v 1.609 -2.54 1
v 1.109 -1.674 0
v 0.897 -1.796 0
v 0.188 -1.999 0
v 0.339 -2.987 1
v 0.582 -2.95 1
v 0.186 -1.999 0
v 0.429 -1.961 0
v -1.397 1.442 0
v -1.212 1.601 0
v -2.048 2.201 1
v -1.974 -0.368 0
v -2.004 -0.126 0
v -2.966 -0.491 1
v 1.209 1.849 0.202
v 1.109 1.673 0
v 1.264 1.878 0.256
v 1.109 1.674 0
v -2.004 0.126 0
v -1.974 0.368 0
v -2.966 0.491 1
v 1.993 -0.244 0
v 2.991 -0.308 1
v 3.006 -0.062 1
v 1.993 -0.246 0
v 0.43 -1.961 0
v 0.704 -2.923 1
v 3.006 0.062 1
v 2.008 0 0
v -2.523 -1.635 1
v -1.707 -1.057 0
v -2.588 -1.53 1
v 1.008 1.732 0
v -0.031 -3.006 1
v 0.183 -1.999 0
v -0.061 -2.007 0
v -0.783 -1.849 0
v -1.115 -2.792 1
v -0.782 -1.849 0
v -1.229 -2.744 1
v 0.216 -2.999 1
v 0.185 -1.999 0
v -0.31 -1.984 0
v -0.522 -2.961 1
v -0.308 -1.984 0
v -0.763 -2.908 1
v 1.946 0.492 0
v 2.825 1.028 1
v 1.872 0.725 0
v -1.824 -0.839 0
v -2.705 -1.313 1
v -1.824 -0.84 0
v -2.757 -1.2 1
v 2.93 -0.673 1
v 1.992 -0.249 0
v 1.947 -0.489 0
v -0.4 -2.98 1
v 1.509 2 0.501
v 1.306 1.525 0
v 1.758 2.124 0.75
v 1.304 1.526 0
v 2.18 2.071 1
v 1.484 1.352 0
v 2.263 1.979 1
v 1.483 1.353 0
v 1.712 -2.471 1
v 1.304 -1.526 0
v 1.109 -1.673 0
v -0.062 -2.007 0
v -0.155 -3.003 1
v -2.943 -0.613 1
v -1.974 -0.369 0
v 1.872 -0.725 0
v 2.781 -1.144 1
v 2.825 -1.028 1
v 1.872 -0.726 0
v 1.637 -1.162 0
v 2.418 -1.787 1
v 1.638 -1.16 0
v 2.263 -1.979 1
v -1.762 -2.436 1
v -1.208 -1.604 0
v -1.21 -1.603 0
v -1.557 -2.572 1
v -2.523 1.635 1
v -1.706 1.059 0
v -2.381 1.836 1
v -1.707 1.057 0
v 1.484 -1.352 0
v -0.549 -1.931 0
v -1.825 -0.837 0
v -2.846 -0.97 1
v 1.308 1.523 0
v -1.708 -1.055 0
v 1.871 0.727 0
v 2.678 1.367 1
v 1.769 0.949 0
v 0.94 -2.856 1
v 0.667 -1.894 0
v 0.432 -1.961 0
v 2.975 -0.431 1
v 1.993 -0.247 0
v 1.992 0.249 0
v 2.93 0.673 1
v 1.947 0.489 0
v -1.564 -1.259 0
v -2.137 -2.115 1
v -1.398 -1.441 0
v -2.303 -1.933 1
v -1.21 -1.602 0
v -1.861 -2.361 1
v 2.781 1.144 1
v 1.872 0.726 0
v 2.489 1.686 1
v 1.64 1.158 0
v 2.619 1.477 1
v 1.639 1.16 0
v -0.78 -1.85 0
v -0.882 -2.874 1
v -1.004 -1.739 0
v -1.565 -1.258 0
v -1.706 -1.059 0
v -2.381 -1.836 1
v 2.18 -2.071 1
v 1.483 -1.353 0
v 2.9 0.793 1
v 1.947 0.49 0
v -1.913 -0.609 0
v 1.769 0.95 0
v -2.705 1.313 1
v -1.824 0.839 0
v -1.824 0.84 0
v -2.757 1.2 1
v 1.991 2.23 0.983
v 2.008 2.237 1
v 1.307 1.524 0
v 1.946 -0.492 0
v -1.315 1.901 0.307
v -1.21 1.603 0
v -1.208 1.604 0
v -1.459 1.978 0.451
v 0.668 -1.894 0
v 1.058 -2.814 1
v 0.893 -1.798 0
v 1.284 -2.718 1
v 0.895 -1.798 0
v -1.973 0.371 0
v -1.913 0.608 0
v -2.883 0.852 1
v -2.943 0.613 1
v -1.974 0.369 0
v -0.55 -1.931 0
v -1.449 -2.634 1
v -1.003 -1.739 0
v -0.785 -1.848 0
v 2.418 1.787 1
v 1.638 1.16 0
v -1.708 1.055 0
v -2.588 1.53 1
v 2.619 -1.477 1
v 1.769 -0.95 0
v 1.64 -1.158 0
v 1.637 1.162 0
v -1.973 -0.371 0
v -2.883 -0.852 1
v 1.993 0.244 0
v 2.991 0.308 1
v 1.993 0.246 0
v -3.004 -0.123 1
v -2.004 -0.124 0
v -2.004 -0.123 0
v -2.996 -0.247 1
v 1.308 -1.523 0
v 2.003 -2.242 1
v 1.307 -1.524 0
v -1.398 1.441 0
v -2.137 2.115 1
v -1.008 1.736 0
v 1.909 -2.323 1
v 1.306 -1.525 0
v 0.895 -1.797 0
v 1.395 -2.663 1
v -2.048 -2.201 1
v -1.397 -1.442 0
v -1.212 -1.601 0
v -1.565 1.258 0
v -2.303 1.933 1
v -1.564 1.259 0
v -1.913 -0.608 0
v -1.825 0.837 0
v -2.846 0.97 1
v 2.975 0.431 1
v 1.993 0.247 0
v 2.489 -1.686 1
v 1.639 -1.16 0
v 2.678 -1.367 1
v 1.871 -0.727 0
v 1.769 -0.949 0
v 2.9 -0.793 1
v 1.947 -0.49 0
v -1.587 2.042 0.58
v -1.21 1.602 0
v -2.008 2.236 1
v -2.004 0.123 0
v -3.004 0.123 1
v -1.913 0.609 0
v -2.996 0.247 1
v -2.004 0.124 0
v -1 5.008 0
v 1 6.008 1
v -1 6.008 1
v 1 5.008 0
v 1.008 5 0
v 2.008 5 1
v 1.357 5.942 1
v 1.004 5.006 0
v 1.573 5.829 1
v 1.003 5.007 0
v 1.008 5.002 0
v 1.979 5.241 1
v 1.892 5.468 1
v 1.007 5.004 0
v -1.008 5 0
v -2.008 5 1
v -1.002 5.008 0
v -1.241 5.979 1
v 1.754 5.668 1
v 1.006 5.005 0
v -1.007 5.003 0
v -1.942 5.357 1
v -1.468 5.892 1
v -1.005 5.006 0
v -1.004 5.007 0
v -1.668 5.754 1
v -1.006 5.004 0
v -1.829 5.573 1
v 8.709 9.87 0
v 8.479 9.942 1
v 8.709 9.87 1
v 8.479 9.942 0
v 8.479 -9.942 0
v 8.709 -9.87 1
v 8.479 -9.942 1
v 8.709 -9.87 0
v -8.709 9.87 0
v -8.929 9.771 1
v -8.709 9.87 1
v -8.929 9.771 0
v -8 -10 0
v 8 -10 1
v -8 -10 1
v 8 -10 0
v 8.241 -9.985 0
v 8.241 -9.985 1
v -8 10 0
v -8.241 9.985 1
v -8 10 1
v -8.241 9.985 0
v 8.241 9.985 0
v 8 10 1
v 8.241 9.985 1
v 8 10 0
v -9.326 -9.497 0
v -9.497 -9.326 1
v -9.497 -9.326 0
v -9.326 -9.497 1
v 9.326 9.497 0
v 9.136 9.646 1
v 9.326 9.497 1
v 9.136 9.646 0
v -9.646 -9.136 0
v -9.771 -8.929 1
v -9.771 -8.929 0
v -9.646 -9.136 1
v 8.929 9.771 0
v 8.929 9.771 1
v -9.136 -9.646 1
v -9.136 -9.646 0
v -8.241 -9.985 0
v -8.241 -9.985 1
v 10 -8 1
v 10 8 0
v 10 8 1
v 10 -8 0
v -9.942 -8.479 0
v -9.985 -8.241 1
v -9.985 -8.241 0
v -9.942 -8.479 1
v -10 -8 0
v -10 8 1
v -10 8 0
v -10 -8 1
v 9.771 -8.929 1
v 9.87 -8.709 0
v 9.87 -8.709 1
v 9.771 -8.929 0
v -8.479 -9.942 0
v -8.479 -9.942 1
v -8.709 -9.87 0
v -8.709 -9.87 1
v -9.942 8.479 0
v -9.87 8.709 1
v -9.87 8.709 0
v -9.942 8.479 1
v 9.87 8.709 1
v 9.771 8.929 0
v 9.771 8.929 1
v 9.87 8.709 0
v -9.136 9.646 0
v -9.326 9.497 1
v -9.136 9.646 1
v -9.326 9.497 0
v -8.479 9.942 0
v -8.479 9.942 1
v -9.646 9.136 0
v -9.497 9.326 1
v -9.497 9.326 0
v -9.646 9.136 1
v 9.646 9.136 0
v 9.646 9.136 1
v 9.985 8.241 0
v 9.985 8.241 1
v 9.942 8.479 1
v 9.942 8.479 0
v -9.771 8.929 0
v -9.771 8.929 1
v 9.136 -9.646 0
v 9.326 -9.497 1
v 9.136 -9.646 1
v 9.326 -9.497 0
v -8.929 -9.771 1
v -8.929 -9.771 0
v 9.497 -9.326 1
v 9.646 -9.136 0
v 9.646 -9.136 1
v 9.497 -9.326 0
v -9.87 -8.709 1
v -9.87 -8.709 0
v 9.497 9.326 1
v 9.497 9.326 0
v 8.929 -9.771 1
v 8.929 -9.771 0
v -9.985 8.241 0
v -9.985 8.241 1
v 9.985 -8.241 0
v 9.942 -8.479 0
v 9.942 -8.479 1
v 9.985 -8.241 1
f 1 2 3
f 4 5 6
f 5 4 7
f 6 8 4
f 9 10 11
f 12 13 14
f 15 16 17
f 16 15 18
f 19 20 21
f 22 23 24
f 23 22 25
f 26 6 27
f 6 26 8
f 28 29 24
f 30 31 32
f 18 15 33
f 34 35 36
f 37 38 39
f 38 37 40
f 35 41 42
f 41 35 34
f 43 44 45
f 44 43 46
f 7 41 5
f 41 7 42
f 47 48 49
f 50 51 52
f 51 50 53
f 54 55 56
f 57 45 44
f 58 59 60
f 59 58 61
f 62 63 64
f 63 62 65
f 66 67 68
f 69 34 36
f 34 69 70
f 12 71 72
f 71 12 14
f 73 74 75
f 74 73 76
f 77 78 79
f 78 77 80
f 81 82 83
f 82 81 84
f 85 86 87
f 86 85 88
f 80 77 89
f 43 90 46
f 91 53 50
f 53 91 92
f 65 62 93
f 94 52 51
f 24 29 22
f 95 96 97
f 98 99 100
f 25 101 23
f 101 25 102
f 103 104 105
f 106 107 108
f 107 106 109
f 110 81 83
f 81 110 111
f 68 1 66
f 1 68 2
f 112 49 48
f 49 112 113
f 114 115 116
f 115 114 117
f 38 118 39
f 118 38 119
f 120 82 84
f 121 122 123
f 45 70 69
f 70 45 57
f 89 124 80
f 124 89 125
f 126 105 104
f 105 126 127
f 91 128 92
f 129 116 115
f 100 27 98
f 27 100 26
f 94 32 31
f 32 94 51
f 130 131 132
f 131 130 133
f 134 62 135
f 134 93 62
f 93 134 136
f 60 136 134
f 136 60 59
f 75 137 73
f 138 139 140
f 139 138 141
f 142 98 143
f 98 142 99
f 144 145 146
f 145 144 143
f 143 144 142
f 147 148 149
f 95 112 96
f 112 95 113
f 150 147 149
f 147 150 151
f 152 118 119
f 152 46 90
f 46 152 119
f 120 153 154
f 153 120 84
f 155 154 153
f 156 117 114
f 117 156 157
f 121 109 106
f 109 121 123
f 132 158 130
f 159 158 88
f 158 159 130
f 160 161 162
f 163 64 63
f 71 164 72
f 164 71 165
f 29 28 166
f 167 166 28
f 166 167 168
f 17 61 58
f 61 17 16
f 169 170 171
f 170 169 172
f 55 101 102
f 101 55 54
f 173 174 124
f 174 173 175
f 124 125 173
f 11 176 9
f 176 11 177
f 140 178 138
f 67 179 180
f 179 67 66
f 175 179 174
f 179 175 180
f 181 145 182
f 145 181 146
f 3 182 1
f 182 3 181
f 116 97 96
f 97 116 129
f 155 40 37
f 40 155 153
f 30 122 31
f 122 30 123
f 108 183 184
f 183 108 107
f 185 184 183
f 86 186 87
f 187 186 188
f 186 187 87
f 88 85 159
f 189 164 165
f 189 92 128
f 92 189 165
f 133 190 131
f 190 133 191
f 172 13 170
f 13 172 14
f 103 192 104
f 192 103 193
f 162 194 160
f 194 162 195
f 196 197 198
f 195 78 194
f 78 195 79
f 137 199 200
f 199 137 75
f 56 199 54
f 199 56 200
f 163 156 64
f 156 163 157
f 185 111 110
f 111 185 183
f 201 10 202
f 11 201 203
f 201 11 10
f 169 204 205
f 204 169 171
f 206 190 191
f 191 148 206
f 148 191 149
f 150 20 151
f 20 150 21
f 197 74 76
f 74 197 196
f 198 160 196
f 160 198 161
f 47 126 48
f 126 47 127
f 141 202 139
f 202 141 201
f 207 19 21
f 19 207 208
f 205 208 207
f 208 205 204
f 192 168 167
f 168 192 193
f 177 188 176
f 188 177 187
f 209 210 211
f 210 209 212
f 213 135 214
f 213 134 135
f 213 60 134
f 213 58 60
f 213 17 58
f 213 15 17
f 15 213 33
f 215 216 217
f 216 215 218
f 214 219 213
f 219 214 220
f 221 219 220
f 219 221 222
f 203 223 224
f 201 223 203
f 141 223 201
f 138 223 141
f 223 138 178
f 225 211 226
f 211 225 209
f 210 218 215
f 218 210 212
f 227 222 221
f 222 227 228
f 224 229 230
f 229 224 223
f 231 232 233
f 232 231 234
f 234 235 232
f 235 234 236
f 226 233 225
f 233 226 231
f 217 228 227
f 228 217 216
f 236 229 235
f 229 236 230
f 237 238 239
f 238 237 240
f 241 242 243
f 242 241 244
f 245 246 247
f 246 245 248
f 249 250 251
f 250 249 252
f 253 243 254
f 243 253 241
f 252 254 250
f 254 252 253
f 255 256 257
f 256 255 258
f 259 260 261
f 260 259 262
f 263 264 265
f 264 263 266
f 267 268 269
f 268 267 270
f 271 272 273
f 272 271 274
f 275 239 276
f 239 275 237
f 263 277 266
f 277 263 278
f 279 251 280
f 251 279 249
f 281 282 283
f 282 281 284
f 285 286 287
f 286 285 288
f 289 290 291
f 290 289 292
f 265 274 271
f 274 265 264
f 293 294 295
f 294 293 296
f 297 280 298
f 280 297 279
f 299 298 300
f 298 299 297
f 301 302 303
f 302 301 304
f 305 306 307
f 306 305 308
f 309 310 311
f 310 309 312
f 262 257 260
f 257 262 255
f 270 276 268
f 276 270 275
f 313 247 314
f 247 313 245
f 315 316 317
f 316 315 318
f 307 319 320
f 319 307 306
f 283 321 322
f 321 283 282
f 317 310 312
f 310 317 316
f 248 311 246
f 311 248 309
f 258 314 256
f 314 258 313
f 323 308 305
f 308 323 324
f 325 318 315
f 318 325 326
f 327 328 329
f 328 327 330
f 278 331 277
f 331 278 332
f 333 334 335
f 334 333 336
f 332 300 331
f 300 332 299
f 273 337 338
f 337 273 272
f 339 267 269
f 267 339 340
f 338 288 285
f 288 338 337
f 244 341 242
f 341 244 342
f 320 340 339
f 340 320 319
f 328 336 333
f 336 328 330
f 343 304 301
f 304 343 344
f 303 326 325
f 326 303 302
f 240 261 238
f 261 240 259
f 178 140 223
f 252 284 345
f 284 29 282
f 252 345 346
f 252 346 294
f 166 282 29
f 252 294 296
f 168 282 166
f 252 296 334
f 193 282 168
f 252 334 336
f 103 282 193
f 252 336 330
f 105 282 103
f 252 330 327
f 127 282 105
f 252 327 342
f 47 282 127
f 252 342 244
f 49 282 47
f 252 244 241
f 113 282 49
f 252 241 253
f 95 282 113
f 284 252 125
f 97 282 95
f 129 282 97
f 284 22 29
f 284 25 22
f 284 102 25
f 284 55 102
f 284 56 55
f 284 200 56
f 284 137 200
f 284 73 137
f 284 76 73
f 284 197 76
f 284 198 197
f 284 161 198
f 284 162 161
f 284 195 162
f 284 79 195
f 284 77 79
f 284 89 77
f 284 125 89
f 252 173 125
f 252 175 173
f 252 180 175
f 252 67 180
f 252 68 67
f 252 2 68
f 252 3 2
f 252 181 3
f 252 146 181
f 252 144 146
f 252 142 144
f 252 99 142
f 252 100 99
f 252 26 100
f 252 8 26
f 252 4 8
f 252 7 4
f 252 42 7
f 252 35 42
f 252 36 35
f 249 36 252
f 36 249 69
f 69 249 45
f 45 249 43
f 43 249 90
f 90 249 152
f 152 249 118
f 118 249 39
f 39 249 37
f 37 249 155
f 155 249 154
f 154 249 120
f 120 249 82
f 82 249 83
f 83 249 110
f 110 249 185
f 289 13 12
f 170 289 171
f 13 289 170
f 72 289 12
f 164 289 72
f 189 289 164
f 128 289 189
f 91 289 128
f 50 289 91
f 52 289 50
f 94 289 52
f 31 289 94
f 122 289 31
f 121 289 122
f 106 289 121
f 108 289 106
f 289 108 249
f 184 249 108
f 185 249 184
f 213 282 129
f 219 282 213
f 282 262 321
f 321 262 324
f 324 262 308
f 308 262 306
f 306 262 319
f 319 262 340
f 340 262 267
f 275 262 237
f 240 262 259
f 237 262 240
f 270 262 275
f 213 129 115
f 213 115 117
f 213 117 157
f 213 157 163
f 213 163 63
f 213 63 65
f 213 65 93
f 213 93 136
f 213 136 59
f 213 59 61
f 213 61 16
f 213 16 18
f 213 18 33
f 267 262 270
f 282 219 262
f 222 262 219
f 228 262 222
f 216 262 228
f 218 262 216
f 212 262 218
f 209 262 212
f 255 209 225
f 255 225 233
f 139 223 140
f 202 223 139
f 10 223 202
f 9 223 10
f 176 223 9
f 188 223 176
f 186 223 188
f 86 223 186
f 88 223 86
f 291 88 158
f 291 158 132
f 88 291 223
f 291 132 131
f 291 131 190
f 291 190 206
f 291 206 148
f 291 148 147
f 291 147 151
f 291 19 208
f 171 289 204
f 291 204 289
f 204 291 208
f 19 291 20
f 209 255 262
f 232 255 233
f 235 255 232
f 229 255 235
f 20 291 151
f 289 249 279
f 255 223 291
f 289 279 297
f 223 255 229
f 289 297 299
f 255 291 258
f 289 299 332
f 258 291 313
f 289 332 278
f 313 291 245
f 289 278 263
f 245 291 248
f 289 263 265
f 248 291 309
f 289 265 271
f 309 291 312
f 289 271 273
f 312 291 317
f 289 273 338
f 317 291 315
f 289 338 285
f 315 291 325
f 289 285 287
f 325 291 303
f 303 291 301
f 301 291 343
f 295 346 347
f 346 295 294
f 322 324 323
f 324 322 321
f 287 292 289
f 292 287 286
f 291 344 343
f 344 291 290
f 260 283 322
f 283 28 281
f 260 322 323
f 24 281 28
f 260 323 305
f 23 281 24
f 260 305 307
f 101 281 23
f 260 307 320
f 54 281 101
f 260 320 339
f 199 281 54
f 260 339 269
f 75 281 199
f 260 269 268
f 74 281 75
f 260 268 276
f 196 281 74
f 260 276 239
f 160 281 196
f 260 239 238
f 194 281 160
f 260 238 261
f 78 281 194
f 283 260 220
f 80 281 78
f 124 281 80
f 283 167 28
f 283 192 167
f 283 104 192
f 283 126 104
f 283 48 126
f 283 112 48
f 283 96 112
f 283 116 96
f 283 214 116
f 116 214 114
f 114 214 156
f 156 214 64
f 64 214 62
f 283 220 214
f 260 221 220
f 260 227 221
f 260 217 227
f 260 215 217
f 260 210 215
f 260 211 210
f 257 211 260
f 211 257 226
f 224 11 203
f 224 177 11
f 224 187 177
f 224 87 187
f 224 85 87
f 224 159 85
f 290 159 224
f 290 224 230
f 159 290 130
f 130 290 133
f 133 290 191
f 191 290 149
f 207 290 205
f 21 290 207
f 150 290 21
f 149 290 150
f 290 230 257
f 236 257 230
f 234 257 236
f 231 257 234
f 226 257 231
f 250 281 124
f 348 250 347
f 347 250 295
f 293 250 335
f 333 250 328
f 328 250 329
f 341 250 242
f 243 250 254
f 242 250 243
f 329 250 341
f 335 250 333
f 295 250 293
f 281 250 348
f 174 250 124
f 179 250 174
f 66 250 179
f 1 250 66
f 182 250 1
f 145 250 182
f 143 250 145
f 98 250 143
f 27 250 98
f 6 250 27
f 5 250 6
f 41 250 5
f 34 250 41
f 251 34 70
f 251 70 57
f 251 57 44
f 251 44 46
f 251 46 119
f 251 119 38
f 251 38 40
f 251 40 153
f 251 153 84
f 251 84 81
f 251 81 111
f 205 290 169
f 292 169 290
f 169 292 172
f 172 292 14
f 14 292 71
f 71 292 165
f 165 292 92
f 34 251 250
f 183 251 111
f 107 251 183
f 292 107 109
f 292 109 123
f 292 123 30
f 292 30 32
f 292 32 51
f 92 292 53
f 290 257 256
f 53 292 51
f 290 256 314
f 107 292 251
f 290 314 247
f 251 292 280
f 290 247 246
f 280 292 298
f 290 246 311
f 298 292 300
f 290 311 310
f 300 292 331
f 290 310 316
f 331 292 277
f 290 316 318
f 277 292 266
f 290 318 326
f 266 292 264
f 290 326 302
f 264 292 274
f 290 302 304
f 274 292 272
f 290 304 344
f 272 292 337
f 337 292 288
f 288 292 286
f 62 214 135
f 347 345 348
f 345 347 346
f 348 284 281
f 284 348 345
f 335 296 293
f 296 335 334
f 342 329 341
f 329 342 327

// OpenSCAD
// file: ../utils/core/clip.scad
//
// NopSCADlib Copyright Chris Palmer 2018
// nop.head@gmail.com
// hydraraptor.blogspot.com
//
// This file is part of NopSCADlib.
//
// NopSCADlib is free software: you can redistribute it and/or modify it under the terms of the
// GNU General Public License as published by the Free Software Foundation, either version 3 of
// the License, or (at your option) any later version.
//
// NopSCADlib is distributed in the hope that it will be useful, but WITHOUT ANY WARRANTY;
// without even the implied warranty of MERCHANTABILITY or FITNESS FOR A PARTICULAR PURPOSE.
// See the GNU General Public License for more details.
//
// You should have received a copy of the GNU General Public License along with NopSCADlib.
// If not, see <https://www.gnu.org/licenses/>.
//

//
//! Construct arbitrarily large box to partition 3D space and clip objects, useful for creating cross sections to see the inside when debugging.
//!
//! Original version by Doug Moen on the OpenSCAD forum
//
//
module box(xmin, ymin, zmin, xmax, ymax, zmax) //! Construct a box given its bounds
    polyhedron(
        [[xmin, ymin, zmin],  // 0
         [xmin, ymin, zmax],  // 1
         [xmin, ymax, zmin],  // 2
         [xmin, ymax, zmax],  // 3
         [xmax, ymin, zmin],  // 4
         [xmax, ymin, zmax],  // 5
         [xmax, ymax, zmin],  // 6
         [xmax, ymax, zmax]], // 7
        [[7,5,1,3],  // top
         [2,0,4,6],  // bottom
         [5,4,0,1],  // front
         [3,2,6,7],  // back
         [5,7,6,4],  // right
         [0,2,3,1]]  // left
    );

module clip(xmin = -big, ymin = -big, zmin = -big, xmax = big, ymax = big, zmax = big, convexity = 1) //! Clip child to specified boundaries
    render(convexity = convexity) intersection() {
        children();

        box(xmin, ymin, zmin, xmax, ymax, zmax);
    }
// file: ../utils/core/rounded_rectangle.scad
//
// NopSCADlib Copyright Chris Palmer 2018
// nop.head@gmail.com
// hydraraptor.blogspot.com
//
// This file is part of NopSCADlib.
//
// NopSCADlib is free software: you can redistribute it and/or modify it under the terms of the
// GNU General Public License as published by the Free Software Foundation, either version 3 of
// the License, or (at your option) any later version.
//
// NopSCADlib is distributed in the hope that it will be useful, but WITHOUT ANY WARRANTY;
// without even the implied warranty of MERCHANTABILITY or FITNESS FOR A PARTICULAR PURPOSE.
// See the GNU General Public License for more details.
//
// You should have received a copy of the GNU General Public License along with NopSCADlib.
// If not, see <https://www.gnu.org/licenses/>.
//

//
//! Rectangle with rounded corners.
//
module rounded_square(size, r, center = true) //! Like `square()` but with with rounded corners
{
    assert(r < min(size.x, size.y) / 2);
    $fn = r2sides4n(r);
    offset(r) offset(-r) square(size, center = center);
}

module rounded_rectangle(size, r, center = false, xy_center = true) //! Like `cube()` but corners rounded in XY plane and separate centre options for xy and z.
{
    extrude_if(size.z, center = center)
        rounded_square([size.x, size.y], r, xy_center);
}

module rounded_cube_xy(size, r = 0, xy_center = false, z_center = false) //! Like `cube()` but corners rounded in XY plane and separate centre options for xy and z.
{
    extrude_if(size.z, center = z_center)
        rounded_square([size.x, size.y], r, xy_center);
}

module rounded_cube_xz(size, r = 0, xy_center = false, z_center = false) //! Like `cube()` but corners rounded in XZ plane and separate centre options for xy and z.
{
    translate([xy_center ? 0 : size.x / 2, xy_center ? 0 : size.y / 2, z_center ? 0 : size.z / 2])
        rotate([90, 0, 0])
            rounded_cube_xy([size.x, size.z, size.y], r, xy_center = true, z_center = true);
}

module rounded_cube_yz(size, r = 0, xy_center = false, z_center = false) //! Like `cube()` but corners rounded in YX plane and separate centre options for xy and z.
{
    translate([xy_center ? 0 : size.x / 2, xy_center ? 0 : size.y / 2, z_center ? 0 : size.z / 2])
        rotate([90, 0, 90])
            rounded_cube_xy([size.y, size.z, size.x], r, xy_center = true, z_center = true);
}
// file: ../utils/core/teardrops.scad
//
// NopSCADlib Copyright Chris Palmer 2018
// nop.head@gmail.com
// hydraraptor.blogspot.com
//
// This file is part of NopSCADlib.
//
// NopSCADlib is free software: you can redistribute it and/or modify it under the terms of the
// GNU General Public License as published by the Free Software Foundation, either version 3 of
// the License, or (at your option) any later version.
//
// NopSCADlib is distributed in the hope that it will be useful, but WITHOUT ANY WARRANTY;
// without even the implied warranty of MERCHANTABILITY or FITNESS FOR A PARTICULAR PURPOSE.
// See the GNU General Public License for more details.
//
// You should have received a copy of the GNU General Public License along with NopSCADlib.
// If not, see <https://www.gnu.org/licenses/>.
//

//
//! For making horizontal holes that don't need support material.
//! Small holes can get away without it, but they print better with truncated teardrops.
//!
//! Using teardrop_plus() or setting the plus option on other modules will elongate the teardrop vertically by the layer height, so when sliced the staircase tips
//! do not intrude into the circle. See <https://hydraraptor.blogspot.com/2020/07/horiholes-2.html>
//
module teardrop(h, r, center = true, truncate = true, chamfer = 0, chamfer_both_ends = true, plus = false) { //! For making horizontal holes that don't need support material, set `truncate = false` to make traditional RepRap teardrops that don't even need bridging
    module teardrop_2d(r, truncate) {
        er = layer_height / 2 - eps;    // Extrusion edge radius
        R = plus ? r + er : r;          // Corrected radius
        offset = plus ? -er : 0;        // Offset inwards
        hull()
            for(side = [0 : 1])
                mirror([side, 0, 0])
                    intersection() {
                        hull()
                            translate([offset, 0]) {
                                circle4n(R);

                                if (teardrop_angle > 0) {
                                    x = R * tan(teardrop_angle / 2);
                                    if(truncate)
                                        translate([0, R / 2])
                                            square([2 * x, R], center = true);
                                    else
                                        polygon([[0, 0], [eps, 0], [0, R + x * tan(min(teardrop_angle, 90 - eps))]]);
                                }
                            }
                        translate([0, -2 * R])
                            square([R, 4 * R]);
                    }
    }

    render(convexity = 5)
        extrude_if(h, center)
            teardrop_2d(r, truncate);

    teardrop_chamfer(h, center, chamfer, chamfer_both_ends) {
        linear_extrude(eps, center = true)
            teardrop_2d(r + chamfer / 2, truncate);

        translate_z(-chamfer / 2)
            linear_extrude(eps, center = true)
                teardrop_2d(r, truncate);
    }
}

module semi_teardrop(h, r, d = undef, center = true, chamfer = 0, chamfer_both_ends = true, plus = false) { //! A semi teardrop in the positive Y domain
    module semi_teardrop_2d(r, d)
        intersection() {
            R = is_undef(d) ? r : d / 2;
            teardrop(r = R, h = 0, plus = plus);

            sq = R + 1;
            translate([-sq, 0])
                square([2 * sq, sq]);
        }

    render(convexity = 5)
        extrude_if(h, center)
            semi_teardrop_2d(r, d);

    teardrop_chamfer(h, center, chamfer, chamfer_both_ends) {
        linear_extrude(eps, center = true)
            semi_teardrop_2d(r + chamfer / 2, d);

        translate_z(-chamfer / 2)
            linear_extrude(eps, center = true)
                semi_teardrop_2d(r, d);
    }
}

module teardrop_plus(h, r, center = true, truncate = true, chamfer = 0, chamfer_both_ends = true) //! Slightly elongated teardrop to allow for the 3D printing staircase effect
    teardrop(h, r, center, truncate, chamfer, chamfer_both_ends, plus = true);

module tearslot(h, r, w, center = true, chamfer = 0, chamfer_both_ends = true, plus = false) { //! A horizontal slot that doesn't need support material
    module tearslot_2d(r, w)
        hull()
            for(x = [-1, 1])
                translate([x * w / 2, 0]) teardrop(r = r, h = 0, plus = plus);

    extrude_if(h, center)
        tearslot_2d(r, w);

    teardrop_chamfer(h, center, chamfer, chamfer_both_ends) {
        linear_extrude(eps, center = true)
            tearslot_2d(r + chamfer / 2, w);

        translate_z(-chamfer / 2)
            linear_extrude(eps, center = true)
                tearslot_2d(r, w);
    }
}

module vertical_tearslot(h, r, l, center = true, chamfer = 0, chamfer_both_ends = true, plus = false) { //! A vertical slot that doesn't need support material
    module vertical_tearslot_2d(r, l)
        hull()
            for(y = [-1, 1])
                translate([0,  y * l / 2])
                    teardrop(0, r, true, plus = plus);

    extrude_if(h, center)
        vertical_tearslot_2d(r, l);

    teardrop_chamfer(h, center, chamfer, chamfer_both_ends) {
        linear_extrude(eps, center = true)
            vertical_tearslot_2d(r + chamfer / 2, l);

        translate_z(-chamfer / 2)
            linear_extrude(eps, center = true)
                vertical_tearslot_2d(r, l);
    }
}

module teardrop_chamfer(h, center, chamfer, chamfer_both_ends) { //! Helper module for adding chamfer to a teardrop
    if(h && chamfer)
        translate_z(center ? 0 : h / 2)
            for(m = chamfer_both_ends ? [0, 1] : [1])
                mirror([0, 0, m])
                    translate_z((h - eps ) / 2)
                        hull()
                            children();
}
// file: ../utils/core/polyholes.scad
//
// NopSCADlib Copyright Chris Palmer 2018
// nop.head@gmail.com
// hydraraptor.blogspot.com
//
// This file is part of NopSCADlib.
//
// NopSCADlib is free software: you can redistribute it and/or modify it under the terms of the
// GNU General Public License as published by the Free Software Foundation, either version 3 of
// the License, or (at your option) any later version.
//
// NopSCADlib is distributed in the hope that it will be useful, but WITHOUT ANY WARRANTY;
// without even the implied warranty of MERCHANTABILITY or FITNESS FOR A PARTICULAR PURPOSE.
// See the GNU General Public License for more details.
//
// You should have received a copy of the GNU General Public License along with NopSCADlib.
// If not, see <https://www.gnu.org/licenses/>.
//

//
//! A method of making 3D printed holes come out the right size regardless of the printer, providing
//! it gets the linear dimensions right. See <https://hydraraptor.blogspot.com/2011/02/polyholes.html>
//!
//! The module provides `poly_circle()`, `poly_cylinder()` and `poly_ring()` that is useful for making printed washers and pillars.
//!
//! `poly_cylinder()` has a `twist` parameter which can be set to make the polygon rotate each layer.
//! This can be used to mitigate the number of sides being small and make small holes stronger and more round, but is quite slow due to the
//! large increase in the number of facets.
//! When set to 1 the polygons alternate each layer, when set higher the rotation takes `twist + 1` layers to repeat.
//! A small additional rotation is added to make the polygon rotate one more side over the length of the hole to make it appear round when
//! viewed end on.
//!
//! When `twist` is set the resulting cylinder is extended by `eps` at each end so that the exact length of the hole can be used without
//! leaving a scar on either surface.
//
function sides(r, n = undef) = is_undef(n) ? max(round(4 * r), 3) : n ? max(n, 3) : r2sides(r); //! Optimum number of sides for specified radius
function corrected_radius(r, n = undef)   = r / cos(180 / sides(r, n));                         //! Adjusted radius to make flats lie on the circle
function corrected_diameter(d, n = undef) = 2 * corrected_radius(d / 2 , n);                    //! Adjusted diameter to make flats lie on the circle

module poly_circle(r, sides = undef) { //! Make a circle adjusted to print the correct size
    n = sides(r, sides);
    circle(r = corrected_radius(r, n), $fn = n);
}

module poly_cylinder(r, h, center = false, sides = undef, chamfer = false, twist = 0) {//! Make a cylinder adjusted to print the correct size
    if(twist) {
        slices = ceil(h / layer_height);
        twists = min(twist + 1, slices);
        sides = sides(r, sides);
        rot = 360 / sides / twists * (twists < slices ? (1 + 1 / slices) : 1);
        if(center)
            for(side = [0, 1])
                mirror([0, 0, side])
                    poly_cylinder(r = r, h = h / 2, sides = sides, twist = twist);
        else
            render(convexity = 5)
                for(i = [0 : slices - 1])
                    translate_z(i * layer_height - eps)
                        rotate(rot * i)
                            poly_cylinder(r = r, h = layer_height + 2 * eps, sides = sides);
    }
    else
        extrude_if(h, center)
            poly_circle(r, sides);

    if(h && chamfer)
        poly_cylinder(r + layer_height, center ? layer_height * 2 : layer_height, center, sides = sides(r, sides));
}

module poly_ring(or, ir, sides = undef) { //! Make a 2D ring adjusted to have the correct internal radius
    cir = corrected_radius(ir, sides);
    filaments = (or - cir) / extrusion_width;
    if(filaments > 3 + eps)
        difference() {
            circle(or);

            poly_circle(ir, sides);
        }
    else
        if(filaments >= 2)
            difference() {
                offset(or - cir)
                    poly_circle(ir, sides);

                poly_circle(ir, sides);
            }
            else
                difference() {
                    poly_circle(or, sides);

                    offset(-squeezed_wall)
                        poly_circle(or, sides);
                }
}

module poly_tube(or, ir, h, center = false) //! Make a tube adjusted to have the correct internal radius
    extrude_if(h, center)
        poly_ring(or, ir);

module drill(r, h = 100, center = true) //! Make a cylinder for drilling holes suitable for CNC routing, set h = 0 for circle
    extrude_if(h, center)
        circle(r = corrected_radius(r, r2sides(r)));

module poly_drill(r, h = 100, center = true) //! Make a cylinder for drilling holes suitable for CNC routing if cnc_bit_r is non zero, otherwise a poly_cylinder.
    if(cnc_bit_r)
        drill(r, h, center = center);
    else
        poly_cylinder(r, h, center);

//
// Horizontal slot
//
module slot(r, l, h = 100, center = false) //! Make a horizontal slot suitable for CNC routing, set h = 0 for 2D version
    extrude_if(h, center)
        hull() {
            translate([l / 2,0])
                drill(r, 0);

            translate([-l / 2,0])
                drill(r, 0);
        }
// file: ../utils/core/bom.scad
//
// NopSCADlib Copyright Chris Palmer 2018
// nop.head@gmail.com
// hydraraptor.blogspot.com
//
// This file is part of NopSCADlib.
//
// NopSCADlib is free software: you can redistribute it and/or modify it under the terms of the
// GNU General Public License as published by the Free Software Foundation, either version 3 of
// the License, or (at your option) any later version.
//
// NopSCADlib is distributed in the hope that it will be useful, but WITHOUT ANY WARRANTY;
// without even the implied warranty of MERCHANTABILITY or FITNESS FOR A PARTICULAR PURPOSE.
// See the GNU General Public License for more details.
//
// You should have received a copy of the GNU General Public License along with NopSCADlib.
// If not, see <https://www.gnu.org/licenses/>.
//

//
//! Bill Of Materials generation via echo and the `bom.py` script. Also handles exploded assembly views and posing.
//! Assembly instructions can precede the module definition that makes the assembly.
//!
//! Assembly views shown in the instructions can be large or small and this is deduced by looking at the size of the printed parts involved and if any routed
//! parts are used.
//! This heuristic isn't always correct, so the default can be overridden by setting the `big` parameter of `assembly` to `true` or `false`.
//!
//! Setting the `ngb` parameter of `assembly` to `true` removes its column from the global BOM and merges it parts into its parent assembly column of the global BOM.
//! This is to prevent the global BOM page becoming too wide in large projects by having it include just the major assemblies.
//!
//! The example below shows how to define a vitamin and incorporate it into an assembly with sub-assemblies and make an exploded view.
//! The resulting flat BOM is shown but hierarchical BOMs are also generated for real projects.
//!
//! If the code to make an STL, DXF or SVG is made a child of the `stl()`, `dxf()` or `svg()` module then the STL, DXF or SVG will be used in the assembly views generated by `views.py` instead of generating
//! it with code.
//! This can speed up the generation of the build instructions greatly but isn't compatible with STLs that include support structures.
//!
//! The `pose()` module allows assembly views in the readme to be posed differently to the default view in the GUI:
//!
//! * Setting the `exploded` parameter to `true` allows just the exploded version to be posed and setting to `false` allows just the assembled view to be posed, the default is both.
//! * If the `d` parameter is set to specify the camera distance then the normal `viewall` and `autocenter` options are suppressed allowing a small section to be zoomed in to fill the view.
//! * To get the parameter values make the GUI window square, pose the view with the mouse and then copy the viewport parameters from the Edit menu and paste them into the pose invocation.
//! * Two `pose()` modules can be chained to allow different poses for exploded and assembled views.
//!
//! The `pose_stl()` module allows an STL child to be posed for its rendered image used in the readme for the project.
//
function bom_mode(n = 1) = (is_undef($bom) ? 0 : $bom) >= n && (is_undef($on_bom) || $on_bom);  //! Current BOM mode, 0 = none, 1 = printed and routed parts and assemblies, 2 includes vitamins as well
function exploded() = is_undef($exploded_parent) ? is_undef($explode) ? 0 : $explode : 0;   //! Returns the value of `$explode` if it is defined, else `0`
function show_supports() = !$preview || exploded();                 //! True if printed support material should be shown

module no_explode()                                                 //! Prevent children being exploded
    let($exploded_parent = true) children();

module explode(d, explode_children = false, offset = [0,0,0], show_line = true) {     //! Explode children by specified Z distance or vector `d`, option to explode grand children
    v = is_list(d) ? d : [0, 0, d];
    o = is_list(offset) ? offset : [0, 0, offset];
    if(exploded() && norm(v)) {
        if(show_line)
            translate(o)                                                // Draw the line first in case the child is transparent
                color("yellow") hull() {
                    sphere(0.2);

                    translate(v * exploded())
                        sphere(0.2);
                }

        translate(v * exploded())
            let($exploded_parent = explode_children ? undef : true)
                children();
    }
    else
        children();
}

module no_pose()                                                    //! Force children not to be posed even if parent is
    let($posed = true, $zoomed = undef) children();

module pose(a = [55, 0, 25], t = [0, 0, 0], exploded = undef, d = undef) //! Pose an assembly for rendering to png by specifying rotation `a`, translation `t` and optionally `d`, `exploded = true for` just the exploded view or `false` for unexploded only.
    let($zoomed = is_undef(d)
            ? is_undef($zoomed)
                ? undef
                : $zoomed
            : is_undef(exploded)
                ? 3
                : exploded
                    ? 2
                    : 1)
        if(is_undef($pose) || !is_undef($posed) || (!is_undef(exploded) && exploded != !!exploded()))
            children();
        else
            let($posed = true) // only pose the top level
                rotate([55, 0, 25])
                    translate_z(is_undef(d) ? 0 : 140 - d)
                        rotate([-a.x, 0, 0])
                            rotate([0, -a.y, 0])
                                rotate([0, 0, -a.z])
                                    translate(-t)
                                        children();

module pose_hflip(exploded = undef)       //! Pose an STL or assembly for rendering to png by flipping around the Y axis, `exploded = true for` just the exploded view or `false` for unexploded only.
    if(is_undef($pose) || !is_undef($posed) || (!is_undef(exploded) && exploded != !!exploded()))
        children();
    else
        let($posed = true) // only pose the top level
            hflip()
                children();

module pose_vflip(exploded = undef)       //! Pose an STL or assembly for rendering to png by flipping around the X axis, `exploded = true for` just the exploded view or `false` for unexploded only.
    if(is_undef($pose) || !is_undef($posed) || (!is_undef(exploded) && exploded != !!exploded()))
        children();
    else
        let($posed = true) // only pose the top level
            vflip()
                children();

module assembly(name, big = undef, ngb = false) {    //! Name an assembly that will appear on the BOM, there needs to a module named `<name>_assembly` to make it. `big` can force big or small assembly diagrams.
    if(bom_mode()) {
        zoom = is_undef($zoomed) ? 0 : $zoomed;
        arglist = str(arg(big, undef, "big"), arg(ngb, false, "ngb"), arg(zoom, 0, "zoomed"));
        args = len(arglist) ? str("(", slice(arglist, 2), ")") : "";
        echo(str("~", name, "_assembly", args, "{"));
    }
    no_pose()
        if(is_undef($child_assembly))
            let($child_assembly = true)
                children();
        else
            no_explode()
                children();

    if(bom_mode())
        echo(str("~}", name, "_assembly"));
}

module stl_colour(colour = pp1_colour, alpha = 1) { //! Colour an stl where it is placed in an assembly. `alpha` can be used to make it appear transparent.
    $stl_colour = colour;
    color(colour, alpha)
        children();
}

module pose_stl(a = [70, 0, 315], t = [0, 0, 0], d = 500) //! Pose an STL for its render, `a`, `t`, & `d` are camera parameters.
    let($stl_camera = str(t.x, ",", t.y, ",", t.z, ",", a.x, ",", a.y, ",", a.z, ",", d))
        children();

module stl(name) {                      //! Name an stl that will appear on the BOM, there needs to a module named `<name>_stl` to make it
    if(bom_mode() && is_undef($in_stl)) {
        colour = is_undef($stl_colour) ? pp1_colour : $stl_colour;
        camera = is_undef($stl_camera) ? "0,0,0,70,0,315,500" : $stl_camera;
        echo(str("~", name, ".stl(colour='", colour, "'| camera='", camera, "')" ));
    }
    if($children)
        if(is_undef($pose))
            let($in_stl = true, $cnc_bit_r = 0)
                children();
        else {
            path = is_undef($target) ? "/stls/" : str("/", $target, "/stls/");
            import(str($cwd, path, name, ".stl"));
        }
}

module dxf(name) {                      //! Name a dxf that will appear on the BOM, there needs to a module named `<name>_dxf` to make it
    if(bom_mode() && is_undef($in_dxf)) {
        if(is_undef($dxf_colour))
            echo(str("~", name, ".dxf"));
        else
            echo(str("~", name, ".dxf(colour='", $dxf_colour, "')"));
    }
    if($children)
        if(is_undef($pose))
            let($in_dfx = true)
                children();
        else {
            path = is_undef($target) ? "/dxfs/" : str("/", $target, "/dxfs/");
            import(str($cwd, path, name, ".dxf"));
        }
}

module svg(name) {                      //! Name an svg that will appear on the BOM, there needs to a module named `<name>_svg` to make it
    if(bom_mode() && is_undef($in_svg)) {
        if(is_undef($dxf_colour))
            echo(str("~", name, ".svg"));
        else
            echo(str("~", name, ".svg(colour='", $dxf_colour, "')"));
    }
    if($children)
        if(is_undef($pose))
            let($in_svg = true)
                children();
        else {
            path = is_undef($target) ? "/svgs/" : str("/", $target, "/svgs/");
            import(str($cwd, path, name, ".svg"));
        }
}

module use_stl(name)                //! Import an STL to make a build platter
    assert(false);                  // Here for documentation only, real version in core.scad

module use_dxf(name)                //! Import a DXF to make a build panel
    assert(false);                  // Here for documentation only, real version in core.scad

module use_svg(name)                //! Import an SVG to make a build panel
    assert(false);                  // Here for documentation only, real version in core.scad

function value_string(value) = is_string(value) ? str("\"", value, "\"") : str(value); //! Convert `value` to a string or quote it if it is already a string

function arg(value, default, name = "") =   //! Create string for arg if not default, helper for `vitamin()`
    value == default ? ""
                     : name ? str(", ", name, " = ", value_string(value))
                            : str(", ", value_string(value));

module vitamin(description) {                //! Describe a vitamin for the BOM entry and precede it with a module call that creates it, eg. "widget(42): Widget size 42"
    if(bom_mode(2))
        echo(str("~", description, !is_undef($hidden) ? " - not shown" : ""));
}

module not_on_bom(on = false)               //! Specify the following child parts are not on the BOM, for example when they are on a PCB that comes assembled
    let($on_bom = on)
        children();

module hidden()                             //! Make item invisible, except on the BOM
    scale(1 / sqr(1024))
        let($hidden = true)
            children();
// file: ../utils/core/sphere.scad
//
// NopSCADlib Copyright Chris Palmer 2018
// nop.head@gmail.com
// hydraraptor.blogspot.com
//
// This file is part of NopSCADlib.
//
// NopSCADlib is free software: you can redistribute it and/or modify it under the terms of the
// GNU General Public License as published by the Free Software Foundation, either version 3 of
// the License, or (at your option) any later version.
//
// NopSCADlib is distributed in the hope that it will be useful, but WITHOUT ANY WARRANTY;
// without even the implied warranty of MERCHANTABILITY or FITNESS FOR A PARTICULAR PURPOSE.
// See the GNU General Public License for more details.
//
// You should have received a copy of the GNU General Public License along with NopSCADlib.
// If not, see <https://www.gnu.org/licenses/>.
//

//! Redefines `sphere()` to always have a vertex on all six half axes I.e. vertices at the poles and the equator and `$fn` a multiple of four.
//! This ensures `hull` and `minkowski` results have the correct dimensions when spheres are placed at the corners.

module sphere(r = 1, d = undef) {                   //! Override `sphere` so that has vertices on all three axes. Has the advantage of giving correct dimensions when hulled
    R = is_undef(d) ? r : d / 2;
    rotate_extrude($fn = r2sides4n(R))
        rotate(-90)
            semi_circle(R);
}
// file: ../utils/core/global.scad
//
// NopSCADlib Copyright Chris Palmer 2018
// nop.head@gmail.com
// hydraraptor.blogspot.com
//
// This file is part of NopSCADlib.
//
// NopSCADlib is free software: you can redistribute it and/or modify it under the terms of the
// GNU General Public License as published by the Free Software Foundation, either version 3 of
// the License, or (at your option) any later version.
//
// NopSCADlib is distributed in the hope that it will be useful, but WITHOUT ANY WARRANTY;
// without even the implied warranty of MERCHANTABILITY or FITNESS FOR A PARTICULAR PURPOSE.
// See the GNU General Public License for more details.
//
// You should have received a copy of the GNU General Public License along with NopSCADlib.
// If not, see <https://www.gnu.org/licenses/>.
//

//
//! Global constants, functions and modules. This file is used directly or indirectly in every scad file.
//! See [global_defs.scad](../../global_defs.scad) for a list of global constants.
//
include <../../global_defs.scad>

function inch(x) = x * 25.4;                                                        //! Inch to mm conversion (For fractional inches, 'inch(1 + 7/8)' will work as expected.)
function foot(x) = x * 25.4 * 12;                                                   //! Foot to mm conversion
function yard(x) = x * 25.4 * 12 * 3;                                               //! Yard to mm conversion
function mm(x)   = x;                                                               //! Explicit mm specified
function cm(x)   = x * 10.0;                                                        //! cm to mm conversion
function m(x)    = x * 1000.0;                                                      //! m to mm conversion

function sqr(x) = x * x;                                                            //! Returns the square of `x`
function echoit(x) = echo(x) x;                                                     //! Echo expression and return it, useful for debugging
function no_point(str) = chr([for(c = str(str)) if(c == ".") ord("p") else ord(c)]);//! Replace decimal point in string with 'p'
function in(list, x) = !!len([for(v = list) if(v == x) true]);                      //! Returns true if `x` is an element in the `list`
function Len(x) = is_list(x) ? len(x) : 0;                                          //! Returns the length of a list or 0 if `x` is not a list
function r2sides(r) = $fn ? $fn : ceil(max(min(360/ $fa, r * 2 * PI / $fs), 5));    //! Replicates the OpenSCAD logic to calculate the number of sides from the radius
function r2sides4n(r) = floor((r2sides(r) + 3) / 4) * 4;                            //! Round up the number of sides to a multiple of 4 to ensure points land on all axes
function limit(x, min, max) = max(min(x, max), min);                                //! Force x in range min <= x <= max

function round_to_layer(z) =  //! Round up to a layer boundary using `layer_height0` for the first layer and `layer_height` for subsequent layers.
    z <= 0 ? 0 :
    z <= layer_height0 ? layer_height0 :
    ceil((z -layer_height0) / layer_height) * layer_height + layer_height0;

function grey(n) = [0.01, 0.01, 0.01] * n;                                          //! Generate a shade of grey to pass to color().

module translate_z(z)                                                               //! Shortcut for Z only translations
    translate([0, 0, z]) children();

module vflip(flip=true)                                                             //! Invert children by doing a 180&deg; flip around the X axis
    rotate([flip ? 180 : 0, 0, 0]) children();

module hflip(flip=true)                                                             //! Invert children by doing a 180&deg; flip around the Y axis
    rotate([0, flip ? 180: 0, 0]) children();

module ellipse(xr, yr)                                                              //! Draw an ellipse
    scale([1, yr / xr]) circle4n(xr);

function slice_str(str, start, end, s ="") = start >= end ? s : slice_str(str, start + 1, end, str(s, str[start])); // Helper for slice()

function slice(list, start = 0, end = undef) = let( //! Slice a list or string with Python type semantics
        len = len(list),
        start = limit(start < 0 ? len + start : start, 0, len),
        end   = is_undef(end) ? len : limit(end   < 0 ? len + end : end, 0, len)
    ) is_string(list) ? slice_str(list, start, end) : [for(i = [start : 1 : end - 1]) list[i]];


module render_if(render = true, convexity = 2)      //! Renders an object if `render` is true, otherwise leaves it unrendered
    if (render)
        render(convexity = convexity)
            children();
    else
        children();

module render_manifold()                            //! Render if manifold to work around convexity bug in manifold
    render_if(manifold)
        children();

module extrude_if(h, center = true)                 //! Extrudes 2D object to 3D when `h` is nonzero, otherwise leaves it 2D
    if(h)
        linear_extrude(h, center = center, convexity = 5) // 3D
            children();
    else
        children();                                 // 2D

module circle4n(r, d = undef) {                     //! Circle with multiple of 4 vertices
    R = is_undef(d) ? r : d / 2;
    circle(R, $fn = r2sides4n(R));
}

module semi_circle(r, d = undef)                    //! A semi circle in the positive Y domain
    intersection() {
        R = is_undef(d) ? r : d / 2;
        circle4n(R);

        sq = R + 1;
        translate([-sq, 0])
            square([2 * sq, sq]);
    }

module right_triangle(width, height, h, center = true) //! A right angled triangle with the 90&deg; corner at the origin. 3D when `h` is nonzero, otherwise 2D
    extrude_if(h, center = center)
        polygon(points = [[0,0], [width, 0], [0, height]]);

include <sphere.scad>
include <bom.scad>
include <polyholes.scad>
include <teardrops.scad>
include <rounded_rectangle.scad>
include <clip.scad>
// file: ../global_defs.scad
//
// NopSCADlib Copyright Chris Palmer 2018
// nop.head@gmail.com
// hydraraptor.blogspot.com
//
// This file is part of NopSCADlib.
//
// NopSCADlib is free software: you can redistribute it and/or modify it under the terms of the
// GNU General Public License as published by the Free Software Foundation, either version 3 of
// the License, or (at your option) any later version.
//
// NopSCADlib is distributed in the hope that it will be useful, but WITHOUT ANY WARRANTY;
// without even the implied warranty of MERCHANTABILITY or FITNESS FOR A PARTICULAR PURPOSE.
// See the GNU General Public License for more details.
//
// You should have received a copy of the GNU General Public License along with NopSCADlib.
// If not, see <https://www.gnu.org/licenses/>.
//

//
// This file included directly or indirectly in every scad file.
//
// This scheme allows the following:
//  bom defaults to 0
//  Setting $bom on the command line or in the main file before including lib.scad overrides it everywhere.
//  Setting $bom after including lib overrides bom in the libs but not in the local file.
//
rr_green = [0, 146/255, 0];                                               // RepRap logo colour
crimson  = [220/255, 20/255, 60/255];

layer_height    = is_undef($layer_height)    ? 0.25   : $layer_height;    // layer height when printing
layer_height0   = is_undef($layer_height0)   ? layer_height : $layer_height0; // height of first layer if different
extrusion_width = is_undef($extrusion_width) ? 0.5    : $extrusion_width; // filament width when printing
nozzle          = is_undef($nozzle)          ? 0.45   : $nozzle;          // 3D printer nozzle
cnc_bit_r       = is_undef($cnc_bit_r)       ? 1.2    : $cnc_bit_r;       // minimum tool radius when milling 2D objects
show_rays       = is_undef($show_rays)       ? false  : $show_rays;       // show camera sight lines and light direction
show_threads    = is_undef($show_threads)    ? false  : $show_threads;    // show screw threads
show_plugs      = is_undef($show_plugs)      ? false  : $show_plugs;      // plugs on headers
teardrop_angle  = is_undef($teardrop_angle)  ? 45     : $teardrop_angle;  // teardrop angle
pp1_colour      = is_undef($pp1_colour)      ? rr_green     : $pp1_colour;// printed part colour 1, RepRap logo colour
pp2_colour      = is_undef($pp2_colour)      ? crimson      : $pp2_colour;// printed part colour 2
pp3_colour      = is_undef($pp3_colour)      ? "SteelBlue"  : $pp3_colour;// printed part colour 3
pp4_colour      = is_undef($pp4_colour)      ? "darkorange" : $pp4_colour;// printed part colour 4
manifold        = is_undef($manifold)        ? false  : $manifold;        // Manifold library being used instead of cgal

// Minimum wall is about two filaments wide but we extrude it closer to get better bonding
squeezed_wall = $preview ? 2 * extrusion_width - layer_height * (1 - PI / 4)
                         : extrusion_width - layer_height / 2 + nozzle / 2 + extrusion_width / 2;

inf = 1e10;       // very big
big = manifold ? 1e3 : inf;     // Not too big for manifold
eps = 1/128;     // small fudge factor to stop CSG barfing on coincident faces.

fa = is_undef($vitamin_fa) ? 6    : $vitamin_fa;          // Used for drawing vitamins, rather than printing.
fs = is_undef($vitamin_fs) ? 0.25 : $vitamin_fs;
fn = 32;

$fa = $fa == 12 ? 6 : $fa;          // Defaults for printing
$fs = $fs == 2 ? extrusion_width / 2 : $fs;


// Some additional named colours
silver           = [0.75, 0.75, 0.75];
gold             = [255, 215,   0] / 255;
brass            = [255, 220, 100] / 255;
copper           = [230, 140,  51] / 255;

/*
 * Enums
 */
//
// Screws
//
hs_cap    = 0;
hs_pan    = 1;
hs_cs     = 2;     // counter sunk
hs_hex    = 3;
hs_grub   = 4;     // pulley set screw
hs_cs_cap = 5;
hs_dome   = 6;
//
// Face enumeration
//
f_bottom = 0;
f_top    = 1;
f_left   = 2;
f_right  = 3;
f_front  = 4;
f_back   = 5;
// file: ../utils/core/core.scad
//
// NopSCADlib Copyright Chris Palmer 2018
// nop.head@gmail.com
// hydraraptor.blogspot.com
//
// This file is part of NopSCADlib.
//
// NopSCADlib is free software: you can redistribute it and/or modify it under the terms of the
// GNU General Public License as published by the Free Software Foundation, either version 3 of
// the License, or (at your option) any later version.
//
// NopSCADlib is distributed in the hope that it will be useful, but WITHOUT ANY WARRANTY;
// without even the implied warranty of MERCHANTABILITY or FITNESS FOR A PARTICULAR PURPOSE.
// See the GNU General Public License for more details.
//
// You should have received a copy of the GNU General Public License along with NopSCADlib.
// If not, see <https://www.gnu.org/licenses/>.
//

//
// Include this file to use the minimum library
//
include <../../global_defs.scad>
//
// Global functions and modules
//
use <global.scad>

module use_stl(name) {               //! Import an STL to make a build platter
    stl(name);
    path = is_undef($target) ? "../stls/" : str($cwd, "/", $target, "/stls/");
    import(str(path, name, ".stl"));
}

module use_dxf(name) {               //! Import a DXF to make a build panel
    dxf(name);
    path = is_undef($target) ? "../dxfs/" : str($cwd, "/", $target, "/dxfs/");
    import(str(path, name, ".dxf"));
}

module use_svg(name) {               //! Import an SVG to make a build panel
    svg(name);
    path = is_undef($target) ? "../svgs/" : str($cwd, "/", $target, "/svgs/");
    import(str(path, name, ".svg"));
}
// file: ../utils/chamfer.scad
//
// NopSCADlib Copyright Chris Palmer 2024
// nop.head@gmail.com
// hydraraptor.blogspot.com
//
// This file is part of NopSCADlib.
//
// NopSCADlib is free software: you can redistribute it and/or modify it under the terms of the
// GNU General Public License as published by the Free Software Foundation, either version 3 of
// the License, or (at your option) any later version.
//
// NopSCADlib is distributed in the hope that it will be useful, but WITHOUT ANY WARRANTY;
// without even the implied warranty of MERCHANTABILITY or FITNESS FOR A PARTICULAR PURPOSE.
// See the GNU General Public License for more details.
//
// You should have received a copy of the GNU General Public License along with NopSCADlib.
// If not, see <https://www.gnu.org/licenses/>.
//

//
//! 45 degree chamfer the entrance to holes.
//!
//! If the hole shape is concave then it must be described as a list of 2D convex children.
//
include <core/core.scad>

module chamfer_hole(depth = 1) {    //! Chamfer a hole given a 2D outline as a child
    for(i = [0 : $children - 1])
        hull() {
            linear_extrude(eps)
                offset(depth)
                    children(i);

            translate_z(-depth)
                linear_extrude(eps)
                    children(i);
        }
}
// file: ../core.scad
//
// NopSCADlib Copyright Chris Palmer 2018
// nop.head@gmail.com
// hydraraptor.blogspot.com
//
// This file is part of NopSCADlib.
//
// NopSCADlib is free software: you can redistribute it and/or modify it under the terms of the
// GNU General Public License as published by the Free Software Foundation, either version 3 of
// the License, or (at your option) any later version.
//
// NopSCADlib is distributed in the hope that it will be useful, but WITHOUT ANY WARRANTY;
// without even the implied warranty of MERCHANTABILITY or FITNESS FOR A PARTICULAR PURPOSE.
// See the GNU General Public License for more details.
//
// You should have received a copy of the GNU General Public License along with NopSCADlib.
// If not, see <https://www.gnu.org/licenses/>.
//

//
// Include this file to use the minimum library plus screws, nuts and washers
//
include <utils/core/core.scad>
//
// Fasteners used by a lot of other vitamins
//
include <vitamins/screws.scad>
// main file
//
// NopSCADlib Copyright Chris Palmer 2025
// nop.head@gmail.com
// hydraraptor.blogspot.com
//
// This file is part of NopSCADlib.
//
// NopSCADlib is free software: you can redistribute it and/or modify it under the terms of the
// GNU General Public License as published by the Free Software Foundation, either version 3 of
// the License, or (at your option) any later version.
//
// NopSCADlib is distributed in the hope that it will be useful, but WITHOUT ANY WARRANTY;
// without even the implied warranty of MERCHANTABILITY or FITNESS FOR A PARTICULAR PURPOSE.
// See the GNU General Public License for more details.
//
// You should have received a copy of the GNU General Public License along with NopSCADlib.
// If not, see <https://www.gnu.org/licenses/>.
//
include <../core.scad>
use <../utils/chamfer.scad>

module chamfer() {
    difference() {
        h = 1;
        rounded_rectangle([20, 20, h], 2);

        translate_z(h)
            chamfer_hole(h + eps) {
                circle(2);

                translate([-1, 0])
                    square([2, 5]);
            }
    }
}

chamfer();
